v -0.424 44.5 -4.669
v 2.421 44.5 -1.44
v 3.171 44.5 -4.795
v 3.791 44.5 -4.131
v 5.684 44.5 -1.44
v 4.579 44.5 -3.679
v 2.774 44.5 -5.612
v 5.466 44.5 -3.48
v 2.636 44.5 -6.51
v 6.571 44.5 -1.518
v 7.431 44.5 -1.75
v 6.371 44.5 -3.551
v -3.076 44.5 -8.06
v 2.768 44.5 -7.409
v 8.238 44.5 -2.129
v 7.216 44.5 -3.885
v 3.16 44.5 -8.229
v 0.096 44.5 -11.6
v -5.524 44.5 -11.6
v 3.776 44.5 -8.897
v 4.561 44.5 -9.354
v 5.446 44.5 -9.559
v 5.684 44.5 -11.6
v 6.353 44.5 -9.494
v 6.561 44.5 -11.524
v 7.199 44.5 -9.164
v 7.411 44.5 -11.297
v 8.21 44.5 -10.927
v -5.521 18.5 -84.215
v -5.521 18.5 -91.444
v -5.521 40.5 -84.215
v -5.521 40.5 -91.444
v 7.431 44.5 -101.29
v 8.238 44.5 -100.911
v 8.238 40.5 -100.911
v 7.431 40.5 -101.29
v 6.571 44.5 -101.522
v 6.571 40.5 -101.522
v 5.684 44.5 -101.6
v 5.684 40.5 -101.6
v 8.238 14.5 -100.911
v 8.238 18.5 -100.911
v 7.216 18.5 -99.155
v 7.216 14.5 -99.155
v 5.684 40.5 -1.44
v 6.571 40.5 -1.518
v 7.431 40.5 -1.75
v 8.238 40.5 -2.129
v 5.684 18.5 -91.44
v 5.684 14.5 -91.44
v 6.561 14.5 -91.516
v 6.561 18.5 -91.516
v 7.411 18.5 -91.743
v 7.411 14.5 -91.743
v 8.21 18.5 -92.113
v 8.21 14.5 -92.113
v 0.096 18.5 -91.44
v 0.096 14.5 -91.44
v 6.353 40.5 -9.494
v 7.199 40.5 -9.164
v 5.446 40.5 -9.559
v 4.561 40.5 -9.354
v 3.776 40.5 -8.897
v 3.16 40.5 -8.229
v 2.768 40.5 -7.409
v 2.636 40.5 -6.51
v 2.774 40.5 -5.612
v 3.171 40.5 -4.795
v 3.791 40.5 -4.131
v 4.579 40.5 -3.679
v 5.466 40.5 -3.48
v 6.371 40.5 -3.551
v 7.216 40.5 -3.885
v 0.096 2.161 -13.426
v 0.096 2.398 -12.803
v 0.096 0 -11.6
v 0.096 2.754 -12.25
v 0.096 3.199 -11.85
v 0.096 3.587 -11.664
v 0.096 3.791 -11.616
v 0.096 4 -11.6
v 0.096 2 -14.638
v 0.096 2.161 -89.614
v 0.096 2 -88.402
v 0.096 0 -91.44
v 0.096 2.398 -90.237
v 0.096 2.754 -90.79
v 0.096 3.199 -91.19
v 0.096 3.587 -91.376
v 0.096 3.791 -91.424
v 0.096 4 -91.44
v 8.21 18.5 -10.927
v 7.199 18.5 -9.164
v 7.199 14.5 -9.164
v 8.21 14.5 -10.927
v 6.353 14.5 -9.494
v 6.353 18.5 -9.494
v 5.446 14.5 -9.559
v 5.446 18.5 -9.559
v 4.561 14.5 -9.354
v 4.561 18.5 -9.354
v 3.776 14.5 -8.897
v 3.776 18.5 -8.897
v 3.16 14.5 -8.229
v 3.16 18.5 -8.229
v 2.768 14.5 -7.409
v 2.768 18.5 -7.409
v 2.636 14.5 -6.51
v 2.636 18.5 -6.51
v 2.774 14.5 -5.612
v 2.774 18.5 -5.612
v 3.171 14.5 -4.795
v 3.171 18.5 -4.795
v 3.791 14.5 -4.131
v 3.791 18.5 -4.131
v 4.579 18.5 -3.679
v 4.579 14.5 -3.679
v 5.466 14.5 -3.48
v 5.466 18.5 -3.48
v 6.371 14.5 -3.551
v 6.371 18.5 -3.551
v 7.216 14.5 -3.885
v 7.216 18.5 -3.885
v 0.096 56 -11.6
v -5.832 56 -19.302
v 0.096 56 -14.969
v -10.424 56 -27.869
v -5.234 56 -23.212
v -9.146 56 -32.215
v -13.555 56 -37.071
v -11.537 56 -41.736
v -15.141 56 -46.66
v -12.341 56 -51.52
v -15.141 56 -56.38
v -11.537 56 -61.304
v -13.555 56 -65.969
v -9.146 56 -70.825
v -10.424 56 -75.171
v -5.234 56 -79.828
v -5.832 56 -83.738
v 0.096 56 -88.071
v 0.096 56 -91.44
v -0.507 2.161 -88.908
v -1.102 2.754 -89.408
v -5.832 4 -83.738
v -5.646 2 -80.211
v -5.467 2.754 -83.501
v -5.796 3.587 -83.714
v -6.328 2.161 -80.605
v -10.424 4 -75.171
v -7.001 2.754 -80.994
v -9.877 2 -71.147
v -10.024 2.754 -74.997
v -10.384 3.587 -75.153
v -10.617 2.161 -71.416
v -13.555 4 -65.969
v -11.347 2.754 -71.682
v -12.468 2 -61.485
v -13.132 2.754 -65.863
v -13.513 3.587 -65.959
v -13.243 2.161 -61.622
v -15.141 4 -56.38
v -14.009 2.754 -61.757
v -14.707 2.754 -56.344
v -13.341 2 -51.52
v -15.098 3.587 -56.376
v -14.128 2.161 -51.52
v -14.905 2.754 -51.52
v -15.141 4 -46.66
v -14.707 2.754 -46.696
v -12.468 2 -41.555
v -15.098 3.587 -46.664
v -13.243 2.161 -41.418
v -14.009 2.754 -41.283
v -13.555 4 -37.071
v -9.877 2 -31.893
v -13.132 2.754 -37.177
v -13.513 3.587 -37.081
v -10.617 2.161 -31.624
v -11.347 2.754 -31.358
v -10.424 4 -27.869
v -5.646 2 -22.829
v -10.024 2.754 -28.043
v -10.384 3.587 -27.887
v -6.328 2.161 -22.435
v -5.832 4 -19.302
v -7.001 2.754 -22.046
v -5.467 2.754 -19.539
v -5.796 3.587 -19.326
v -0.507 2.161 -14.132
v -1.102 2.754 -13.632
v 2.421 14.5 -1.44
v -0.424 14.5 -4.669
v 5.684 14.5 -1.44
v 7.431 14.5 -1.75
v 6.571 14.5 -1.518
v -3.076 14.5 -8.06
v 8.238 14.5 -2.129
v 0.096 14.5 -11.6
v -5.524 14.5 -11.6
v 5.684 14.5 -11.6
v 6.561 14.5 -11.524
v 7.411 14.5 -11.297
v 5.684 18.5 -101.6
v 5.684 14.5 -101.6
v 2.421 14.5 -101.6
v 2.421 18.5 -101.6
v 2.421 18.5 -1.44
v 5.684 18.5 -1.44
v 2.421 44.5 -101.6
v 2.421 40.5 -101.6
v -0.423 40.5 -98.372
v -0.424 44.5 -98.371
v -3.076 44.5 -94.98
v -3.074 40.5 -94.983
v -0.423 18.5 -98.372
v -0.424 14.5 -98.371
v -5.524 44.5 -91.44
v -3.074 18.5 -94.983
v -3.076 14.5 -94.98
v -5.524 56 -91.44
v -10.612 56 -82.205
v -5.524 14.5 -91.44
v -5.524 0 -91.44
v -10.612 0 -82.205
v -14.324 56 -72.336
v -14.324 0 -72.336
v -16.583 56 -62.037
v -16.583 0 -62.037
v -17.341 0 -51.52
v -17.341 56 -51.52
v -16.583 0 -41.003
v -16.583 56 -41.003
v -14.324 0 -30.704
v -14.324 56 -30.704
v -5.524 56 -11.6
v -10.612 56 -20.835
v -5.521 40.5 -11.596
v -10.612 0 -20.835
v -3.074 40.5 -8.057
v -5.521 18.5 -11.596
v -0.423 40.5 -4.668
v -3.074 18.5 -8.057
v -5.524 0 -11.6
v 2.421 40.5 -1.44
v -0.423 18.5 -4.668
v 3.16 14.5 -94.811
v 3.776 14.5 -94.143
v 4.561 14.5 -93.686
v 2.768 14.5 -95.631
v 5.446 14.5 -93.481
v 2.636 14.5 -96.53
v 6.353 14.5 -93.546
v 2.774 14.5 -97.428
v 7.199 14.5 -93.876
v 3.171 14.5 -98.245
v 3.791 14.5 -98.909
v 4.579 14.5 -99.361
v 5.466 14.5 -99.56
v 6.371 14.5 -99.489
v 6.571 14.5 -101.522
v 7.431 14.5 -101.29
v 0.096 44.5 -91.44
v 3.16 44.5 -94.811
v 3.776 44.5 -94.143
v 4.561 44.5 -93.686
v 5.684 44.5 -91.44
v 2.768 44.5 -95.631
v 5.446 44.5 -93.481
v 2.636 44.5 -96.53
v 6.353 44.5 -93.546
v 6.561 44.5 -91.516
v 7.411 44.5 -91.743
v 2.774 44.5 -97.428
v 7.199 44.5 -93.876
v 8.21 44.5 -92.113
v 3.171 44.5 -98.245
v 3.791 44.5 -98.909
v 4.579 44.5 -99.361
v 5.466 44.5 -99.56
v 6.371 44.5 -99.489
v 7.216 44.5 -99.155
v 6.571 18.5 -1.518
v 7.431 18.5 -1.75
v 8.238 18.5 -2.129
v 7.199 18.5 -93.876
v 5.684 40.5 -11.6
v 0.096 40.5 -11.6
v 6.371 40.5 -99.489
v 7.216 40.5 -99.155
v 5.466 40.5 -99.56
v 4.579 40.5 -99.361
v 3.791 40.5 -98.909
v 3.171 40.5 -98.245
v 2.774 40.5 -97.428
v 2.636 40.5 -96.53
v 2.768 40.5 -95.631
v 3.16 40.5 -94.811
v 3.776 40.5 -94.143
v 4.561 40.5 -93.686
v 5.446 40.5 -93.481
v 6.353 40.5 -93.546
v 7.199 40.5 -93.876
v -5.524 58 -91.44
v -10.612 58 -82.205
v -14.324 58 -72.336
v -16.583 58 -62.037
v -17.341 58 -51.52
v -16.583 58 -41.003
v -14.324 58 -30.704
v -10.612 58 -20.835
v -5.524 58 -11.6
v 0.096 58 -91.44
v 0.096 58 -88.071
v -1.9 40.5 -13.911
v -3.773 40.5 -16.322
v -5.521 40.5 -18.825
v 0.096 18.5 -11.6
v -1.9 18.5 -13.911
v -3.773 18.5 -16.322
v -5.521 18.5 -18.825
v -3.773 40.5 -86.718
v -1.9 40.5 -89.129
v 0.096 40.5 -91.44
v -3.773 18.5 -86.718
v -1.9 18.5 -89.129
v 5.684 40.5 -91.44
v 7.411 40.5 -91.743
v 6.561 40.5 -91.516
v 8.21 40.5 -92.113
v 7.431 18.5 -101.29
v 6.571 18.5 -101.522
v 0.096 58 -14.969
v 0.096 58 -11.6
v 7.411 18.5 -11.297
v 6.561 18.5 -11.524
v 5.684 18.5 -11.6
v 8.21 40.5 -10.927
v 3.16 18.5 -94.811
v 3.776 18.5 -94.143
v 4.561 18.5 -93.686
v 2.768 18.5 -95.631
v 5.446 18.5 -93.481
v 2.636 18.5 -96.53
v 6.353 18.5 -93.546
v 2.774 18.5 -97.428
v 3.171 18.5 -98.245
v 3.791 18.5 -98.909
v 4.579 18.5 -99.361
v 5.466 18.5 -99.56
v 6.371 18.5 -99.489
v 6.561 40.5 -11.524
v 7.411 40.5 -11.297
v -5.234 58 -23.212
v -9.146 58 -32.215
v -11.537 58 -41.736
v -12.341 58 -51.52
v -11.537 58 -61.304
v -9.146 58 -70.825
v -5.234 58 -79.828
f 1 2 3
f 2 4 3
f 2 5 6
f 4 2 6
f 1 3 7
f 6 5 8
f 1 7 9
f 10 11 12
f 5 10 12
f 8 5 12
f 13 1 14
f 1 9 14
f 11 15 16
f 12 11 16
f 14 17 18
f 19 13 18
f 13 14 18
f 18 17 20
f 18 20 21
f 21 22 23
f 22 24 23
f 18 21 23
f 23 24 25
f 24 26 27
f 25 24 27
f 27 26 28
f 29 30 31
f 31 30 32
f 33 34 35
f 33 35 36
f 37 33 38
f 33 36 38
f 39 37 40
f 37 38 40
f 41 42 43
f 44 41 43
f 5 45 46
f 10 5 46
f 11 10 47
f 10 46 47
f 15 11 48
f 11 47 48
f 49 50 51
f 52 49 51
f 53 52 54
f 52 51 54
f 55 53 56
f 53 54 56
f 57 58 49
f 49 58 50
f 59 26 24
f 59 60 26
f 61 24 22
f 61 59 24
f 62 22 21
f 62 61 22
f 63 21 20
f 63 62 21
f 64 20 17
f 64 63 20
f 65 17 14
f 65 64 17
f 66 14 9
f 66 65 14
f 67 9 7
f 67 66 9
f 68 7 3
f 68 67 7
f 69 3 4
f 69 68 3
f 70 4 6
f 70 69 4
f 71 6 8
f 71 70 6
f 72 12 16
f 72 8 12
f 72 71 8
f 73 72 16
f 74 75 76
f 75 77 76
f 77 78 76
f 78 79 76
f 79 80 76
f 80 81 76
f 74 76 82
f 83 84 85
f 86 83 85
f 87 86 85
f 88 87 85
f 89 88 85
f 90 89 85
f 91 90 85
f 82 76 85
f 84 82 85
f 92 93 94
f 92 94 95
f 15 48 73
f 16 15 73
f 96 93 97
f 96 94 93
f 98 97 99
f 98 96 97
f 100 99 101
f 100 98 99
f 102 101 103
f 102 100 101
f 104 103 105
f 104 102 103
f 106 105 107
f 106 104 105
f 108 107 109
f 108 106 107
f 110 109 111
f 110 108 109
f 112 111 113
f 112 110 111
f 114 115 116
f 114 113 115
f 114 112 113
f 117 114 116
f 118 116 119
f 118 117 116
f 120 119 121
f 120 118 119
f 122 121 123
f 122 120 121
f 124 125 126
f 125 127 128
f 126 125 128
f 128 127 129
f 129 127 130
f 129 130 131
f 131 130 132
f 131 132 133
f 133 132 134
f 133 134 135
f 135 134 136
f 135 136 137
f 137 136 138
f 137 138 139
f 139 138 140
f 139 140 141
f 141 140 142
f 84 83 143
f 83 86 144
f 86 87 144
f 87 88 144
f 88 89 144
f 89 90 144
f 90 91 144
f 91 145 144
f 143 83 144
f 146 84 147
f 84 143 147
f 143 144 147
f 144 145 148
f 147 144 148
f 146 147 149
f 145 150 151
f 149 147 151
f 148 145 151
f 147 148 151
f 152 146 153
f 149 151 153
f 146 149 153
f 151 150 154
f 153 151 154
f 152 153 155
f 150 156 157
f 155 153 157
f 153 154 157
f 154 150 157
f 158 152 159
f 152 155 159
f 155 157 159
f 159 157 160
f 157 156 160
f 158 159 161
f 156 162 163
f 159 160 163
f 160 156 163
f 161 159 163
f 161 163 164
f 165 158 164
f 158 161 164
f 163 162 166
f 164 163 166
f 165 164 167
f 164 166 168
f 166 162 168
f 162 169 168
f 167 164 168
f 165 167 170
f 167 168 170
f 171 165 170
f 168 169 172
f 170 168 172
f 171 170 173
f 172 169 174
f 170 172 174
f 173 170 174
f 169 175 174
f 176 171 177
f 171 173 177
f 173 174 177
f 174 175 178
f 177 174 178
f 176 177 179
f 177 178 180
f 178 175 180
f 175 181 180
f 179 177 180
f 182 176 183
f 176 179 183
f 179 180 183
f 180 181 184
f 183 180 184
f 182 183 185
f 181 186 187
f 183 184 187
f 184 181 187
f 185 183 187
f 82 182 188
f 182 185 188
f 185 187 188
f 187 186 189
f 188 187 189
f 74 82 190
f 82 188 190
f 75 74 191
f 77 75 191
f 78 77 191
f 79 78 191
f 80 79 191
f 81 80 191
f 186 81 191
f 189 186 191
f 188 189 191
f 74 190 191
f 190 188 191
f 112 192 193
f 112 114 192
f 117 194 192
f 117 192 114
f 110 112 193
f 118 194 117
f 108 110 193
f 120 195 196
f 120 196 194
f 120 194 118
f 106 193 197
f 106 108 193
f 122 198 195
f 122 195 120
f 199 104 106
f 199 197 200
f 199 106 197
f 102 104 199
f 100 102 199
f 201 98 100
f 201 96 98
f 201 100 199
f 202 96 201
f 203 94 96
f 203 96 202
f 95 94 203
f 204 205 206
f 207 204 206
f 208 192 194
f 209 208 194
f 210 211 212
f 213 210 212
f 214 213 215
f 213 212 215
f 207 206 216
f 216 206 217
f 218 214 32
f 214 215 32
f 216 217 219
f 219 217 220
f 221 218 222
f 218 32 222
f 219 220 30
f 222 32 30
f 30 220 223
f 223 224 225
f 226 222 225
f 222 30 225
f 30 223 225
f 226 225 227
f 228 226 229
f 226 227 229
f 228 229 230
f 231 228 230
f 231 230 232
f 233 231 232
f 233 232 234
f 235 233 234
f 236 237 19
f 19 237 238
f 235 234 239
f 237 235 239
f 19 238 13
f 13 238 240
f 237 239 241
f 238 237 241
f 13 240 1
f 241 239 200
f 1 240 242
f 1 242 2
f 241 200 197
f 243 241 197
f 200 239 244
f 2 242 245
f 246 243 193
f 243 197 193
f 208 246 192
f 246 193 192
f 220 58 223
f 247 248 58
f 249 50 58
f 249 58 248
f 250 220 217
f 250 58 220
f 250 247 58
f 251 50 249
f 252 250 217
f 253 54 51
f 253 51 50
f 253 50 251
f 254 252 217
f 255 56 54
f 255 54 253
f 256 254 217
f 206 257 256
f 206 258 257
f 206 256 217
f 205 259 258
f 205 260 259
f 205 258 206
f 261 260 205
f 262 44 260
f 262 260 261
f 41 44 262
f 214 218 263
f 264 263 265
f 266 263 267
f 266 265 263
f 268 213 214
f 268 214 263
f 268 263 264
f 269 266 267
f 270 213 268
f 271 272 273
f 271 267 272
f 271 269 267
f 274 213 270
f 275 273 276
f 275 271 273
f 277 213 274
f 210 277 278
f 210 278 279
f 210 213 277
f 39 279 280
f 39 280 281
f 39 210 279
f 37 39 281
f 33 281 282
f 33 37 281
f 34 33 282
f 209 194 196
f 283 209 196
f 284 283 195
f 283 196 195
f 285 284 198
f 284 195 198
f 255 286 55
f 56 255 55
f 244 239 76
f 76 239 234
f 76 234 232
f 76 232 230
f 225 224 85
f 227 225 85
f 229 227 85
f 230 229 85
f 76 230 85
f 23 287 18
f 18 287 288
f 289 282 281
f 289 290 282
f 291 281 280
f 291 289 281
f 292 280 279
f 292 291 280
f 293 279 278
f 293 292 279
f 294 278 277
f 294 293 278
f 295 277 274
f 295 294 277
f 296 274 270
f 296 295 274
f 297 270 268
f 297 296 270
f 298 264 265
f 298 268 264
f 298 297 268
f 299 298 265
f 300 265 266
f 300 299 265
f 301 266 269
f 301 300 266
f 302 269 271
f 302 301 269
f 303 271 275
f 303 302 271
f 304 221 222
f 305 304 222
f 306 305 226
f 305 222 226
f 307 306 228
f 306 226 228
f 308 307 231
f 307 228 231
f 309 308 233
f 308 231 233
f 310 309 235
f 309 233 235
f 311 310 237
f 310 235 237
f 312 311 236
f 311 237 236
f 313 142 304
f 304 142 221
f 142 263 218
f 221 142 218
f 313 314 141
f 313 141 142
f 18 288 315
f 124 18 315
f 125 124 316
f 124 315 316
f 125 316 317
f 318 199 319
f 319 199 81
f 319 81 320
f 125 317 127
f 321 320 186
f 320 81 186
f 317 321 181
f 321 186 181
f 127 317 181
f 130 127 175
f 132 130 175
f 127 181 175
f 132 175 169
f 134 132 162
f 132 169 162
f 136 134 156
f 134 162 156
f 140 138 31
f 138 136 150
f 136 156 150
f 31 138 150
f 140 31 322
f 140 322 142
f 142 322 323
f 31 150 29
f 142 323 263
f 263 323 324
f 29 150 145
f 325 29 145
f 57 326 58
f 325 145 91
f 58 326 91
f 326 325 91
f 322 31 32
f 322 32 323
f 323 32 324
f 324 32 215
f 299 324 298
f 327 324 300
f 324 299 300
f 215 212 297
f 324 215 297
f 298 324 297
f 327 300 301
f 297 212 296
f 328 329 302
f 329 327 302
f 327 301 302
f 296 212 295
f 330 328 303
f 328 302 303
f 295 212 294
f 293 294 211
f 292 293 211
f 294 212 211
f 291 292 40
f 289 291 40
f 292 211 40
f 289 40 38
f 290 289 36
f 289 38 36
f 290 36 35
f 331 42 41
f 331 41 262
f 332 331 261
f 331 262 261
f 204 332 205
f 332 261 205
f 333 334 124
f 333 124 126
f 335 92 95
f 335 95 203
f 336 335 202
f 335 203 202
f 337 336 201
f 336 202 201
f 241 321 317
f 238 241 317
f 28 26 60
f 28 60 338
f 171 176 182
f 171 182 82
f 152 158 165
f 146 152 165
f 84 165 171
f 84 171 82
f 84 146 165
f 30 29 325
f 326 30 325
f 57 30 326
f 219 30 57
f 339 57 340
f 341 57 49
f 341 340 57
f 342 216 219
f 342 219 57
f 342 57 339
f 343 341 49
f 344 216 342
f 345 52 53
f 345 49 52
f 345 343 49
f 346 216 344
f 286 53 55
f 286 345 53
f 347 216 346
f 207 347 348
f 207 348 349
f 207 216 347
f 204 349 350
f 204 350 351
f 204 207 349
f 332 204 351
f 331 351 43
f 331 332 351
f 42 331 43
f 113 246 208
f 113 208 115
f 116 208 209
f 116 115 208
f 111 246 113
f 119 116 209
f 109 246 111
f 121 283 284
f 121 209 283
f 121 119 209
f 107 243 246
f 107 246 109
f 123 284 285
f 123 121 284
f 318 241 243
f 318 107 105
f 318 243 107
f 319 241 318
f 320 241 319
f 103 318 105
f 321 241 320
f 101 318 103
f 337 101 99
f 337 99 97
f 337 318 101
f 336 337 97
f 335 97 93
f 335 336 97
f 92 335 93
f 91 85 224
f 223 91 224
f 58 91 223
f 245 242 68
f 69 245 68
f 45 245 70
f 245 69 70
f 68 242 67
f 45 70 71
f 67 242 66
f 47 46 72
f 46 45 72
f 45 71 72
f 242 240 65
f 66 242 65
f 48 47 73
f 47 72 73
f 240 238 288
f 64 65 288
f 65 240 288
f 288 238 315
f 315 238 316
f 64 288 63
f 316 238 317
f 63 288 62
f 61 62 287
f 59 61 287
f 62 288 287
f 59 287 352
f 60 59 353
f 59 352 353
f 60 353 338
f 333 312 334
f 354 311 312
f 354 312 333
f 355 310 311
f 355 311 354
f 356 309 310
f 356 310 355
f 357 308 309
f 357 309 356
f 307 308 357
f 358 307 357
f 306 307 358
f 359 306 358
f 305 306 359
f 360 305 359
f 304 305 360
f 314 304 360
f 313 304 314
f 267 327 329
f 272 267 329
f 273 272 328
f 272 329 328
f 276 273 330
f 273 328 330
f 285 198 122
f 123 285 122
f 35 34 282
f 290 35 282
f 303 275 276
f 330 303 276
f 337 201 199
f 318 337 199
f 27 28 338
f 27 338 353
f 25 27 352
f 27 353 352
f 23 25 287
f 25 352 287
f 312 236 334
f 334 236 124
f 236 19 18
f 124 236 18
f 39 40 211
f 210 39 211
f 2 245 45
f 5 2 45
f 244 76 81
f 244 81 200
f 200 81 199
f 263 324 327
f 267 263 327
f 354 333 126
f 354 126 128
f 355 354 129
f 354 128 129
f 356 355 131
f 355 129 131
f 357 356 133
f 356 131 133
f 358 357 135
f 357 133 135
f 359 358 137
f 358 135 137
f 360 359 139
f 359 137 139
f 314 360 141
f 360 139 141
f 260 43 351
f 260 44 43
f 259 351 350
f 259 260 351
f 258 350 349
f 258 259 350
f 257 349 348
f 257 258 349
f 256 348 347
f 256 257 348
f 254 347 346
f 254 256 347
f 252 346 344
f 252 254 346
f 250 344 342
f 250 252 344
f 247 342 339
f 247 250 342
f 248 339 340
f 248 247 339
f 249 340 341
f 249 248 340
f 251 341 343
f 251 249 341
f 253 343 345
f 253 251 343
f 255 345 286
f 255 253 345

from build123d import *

# Parameters (mm, degrees)
SKETCH2_R               = 3.048
BOSS_EXTRUDE1_DEPTH     = 56
CUT_EXTRUDE2_DEPTH      = 118.2998702
CUT_EXTRUDE3_DEPTH      = 117.054836818
CUT_EXTRUDE3_DEPTH_BACK = 117.054836818
SKETCH12_W              = 5.816526385
SKETCH12_H              = 22
SKETCH12_H_2            = 11.5
SKETCH12_H_3            = 14.5
SKETCH13_W              = 10.16
SKETCH13_H              = 11.5
SKETCH13_H_2            = 14.5
CUT_EXTRUDE4_DEPTH      = 10
FILLET1_R               = 10
BOSS_EXTRUDE2_DEPTH     = 2
FILLET2_R               = 2
BOSS_EXTRUDE3_DEPTH     = 2
SKETCH18_W              = 2.878327065
SKETCH18_H              = 3.541775271
SKETCH18_W_2            = 3.166541323
SKETCH18_H_2            = 3.584686202
CUT_EXTRUDE5_DEPTH      = 2
CUT_EXTRUDE7_DEPTH      = 109.465199714
CUT_EXTRUDE7_DEPTH_BACK = 109.465199714
SKETCH19_W              = 7.941935835
SKETCH19_H              = 22


with BuildPart() as part:
    # Sketch2 → Boss-Extrude1 (new body)
    with BuildSketch(Plane(origin=(0, 0, 0), x_dir=(1, 0, 0), z_dir=(0, 1, 0))):
        with BuildLine():
            Line((0.095782763, 91.44), (5.683782763, 91.44))
            ThreePointArc((5.683782763, 91.44), (10.763782763, 96.52), (5.683782763, 101.6))
            Line((5.683782763, 101.6), (2.421245281, 101.6))
            ThreePointArc((2.421245281, 101.6), (-17.340690554, 51.52), (2.421245281, 1.44))
            Line((2.421245281, 1.44), (5.683782763, 1.44))
            ThreePointArc((5.683782763, 1.44), (10.763782763, 6.52), (5.683782763, 11.6))
            Line((5.683782763, 11.6), (0.095782763, 11.6))
            ThreePointArc((0.095782763, 11.6), (-15.340690554, 51.52), (0.095782763, 91.44))
        make_face()
        with Locations(Location((5.683782763, 96.52, 0), (0, 0, 270))):
            Circle(SKETCH2_R, mode=Mode.SUBTRACT)
        with Locations(Location((5.683782763, 6.52, 0), (0, 0, 90))):
            Circle(SKETCH2_R, mode=Mode.SUBTRACT)
    extrude(amount=BOSS_EXTRUDE1_DEPTH)

    # Sketch6 → Cut-Extrude2 (cut, symmetric)
    with BuildSketch(Plane(origin=(0, 56, 0), x_dir=(1, 0, 0), z_dir=(0, 1, 0))):
        Polygon((5.683782763, 6.52), (11.45705153, 16.593499718), (11.45705153, -3.406500282), align=None)
    cut_extrude2 = extrude(amount=CUT_EXTRUDE2_DEPTH, both=True, mode=Mode.SUBTRACT)

    # Mirror1: Cut-Extrude2 across plane
    add(cut_extrude2.mirror(Plane.XY.offset(-51.52)), mode=Mode.SUBTRACT)

    # Sketch12 → Cut-Extrude3 (cut, two sides: drawn at the far end of the back side and taken through both)
    with BuildSketch(Plane.XY.offset(-1.44).offset(-CUT_EXTRUDE3_DEPTH_BACK)):
        with Locations((5.329508474, 29.5)):
            Rectangle(SKETCH12_W, SKETCH12_H)
        with Locations((5.329508474, 50.25)):
            Rectangle(SKETCH12_W, SKETCH12_H_2)
        with Locations((5.329508474, 7.25)):
            Rectangle(SKETCH12_W, SKETCH12_H_3)
    extrude(amount=CUT_EXTRUDE3_DEPTH + CUT_EXTRUDE3_DEPTH_BACK, mode=Mode.SUBTRACT)

    # Sketch13 → Cut-Extrude4 (cut)
    with BuildSketch(Plane(origin=(2.421245281, 0, 0), x_dir=(0, 0, -1), z_dir=(1, 0, 0))):
        with Locations((6.52, 50.25)):
            Rectangle(SKETCH13_W, SKETCH13_H)
        with Locations((6.52, 7.25)):
            Rectangle(SKETCH13_W, SKETCH13_H_2)
        with Locations((96.52, 50.25)):
            Rectangle(SKETCH13_W, SKETCH13_H)
        with Locations((96.52, 7.25)):
            Rectangle(SKETCH13_W, SKETCH13_H_2)
    extrude(amount=-CUT_EXTRUDE4_DEPTH, mode=Mode.SUBTRACT)

    # Fillet1
    # the kernel refuses this fillet: 10 mm, written as the material it takes off along each edge
    with BuildSketch(Plane(origin=(2.421245281, 18.5, -91.44), x_dir=(0, 0, -1), z_dir=(0, 1, 0)), Plane(origin=(2.421245281, 40.5, -11.6), x_dir=(0, 0, 1), z_dir=(0, -1, 0))) as fillet1_piece_1:
        with BuildLine():
            CenterArc((6.411043164, 10), FILLET1_R, 230.125785038, 39.874214962)
            Line((0, 2.325462519), (0, 0))
            Line((0, 0), (6.411043164, 0))
        make_face()
    extrude(amount=22, mode=Mode.SUBTRACT)

    # Sketch15 → Boss-Extrude2 (add)
    with BuildSketch(Plane(origin=(0, 0, 0), x_dir=(-1, 0, 0), z_dir=(0, -1, 0))):
        with BuildLine():
            Line((-0.095782763, 11.6), (-0.095782763, 91.44))
            ThreePointArc((-0.095782763, 91.44), (15.340690554, 51.52), (-0.095782763, 11.6))
        make_face()
    extrude(amount=-BOSS_EXTRUDE2_DEPTH)

    # Fillet2
    fillet2_edges = [part.edges().sort_by_distance(p)[0] for p in [
        (-15.340690554, 2, -51.52),
    ]]
    fillet(fillet2_edges, radius=FILLET2_R)

    # Sketch17 → Boss-Extrude3 (add)
    with BuildSketch(Plane(origin=(0, 56, 0), x_dir=(1, 0, 0), z_dir=(0, 1, 0))):
        with BuildLine():
            Line((2.889782763, 91.44), (-5.523575239, 91.44))
            ThreePointArc((-5.523575239, 91.44), (-17.340690554, 51.52), (-5.523575239, 11.6))
            Line((-5.523575239, 11.6), (2.889782763, 11.6))
            ThreePointArc((2.889782763, 11.6), (-12.340690554, 51.52), (2.889782763, 91.44))
        make_face()
    extrude(amount=BOSS_EXTRUDE3_DEPTH)

    # Sketch18 → Cut-Extrude5 (cut)
    with BuildSketch(Plane(origin=(0, 58, 0), x_dir=(1, 0, 0), z_dir=(0, 1, 0))):
        with Locations((1.534946295, 13.370887636)):
            Rectangle(SKETCH18_W, SKETCH18_H)
        with Locations((1.679053424, 89.647656899)):
            Rectangle(SKETCH18_W_2, SKETCH18_H_2)
    extrude(amount=-CUT_EXTRUDE5_DEPTH, mode=Mode.SUBTRACT)

    # Sketch19 → Cut-Extrude7 (cut, two sides: drawn at the far end of the back side and taken through both)
    with BuildSketch(Plane.XY.offset(-11.6).offset(-CUT_EXTRUDE7_DEPTH_BACK)):
        with Locations((-1.549722637, 29.5)):
            Rectangle(SKETCH19_W, SKETCH19_H)
    extrude(amount=CUT_EXTRUDE7_DEPTH + CUT_EXTRUDE7_DEPTH_BACK, mode=Mode.SUBTRACT)


solid = part.part
